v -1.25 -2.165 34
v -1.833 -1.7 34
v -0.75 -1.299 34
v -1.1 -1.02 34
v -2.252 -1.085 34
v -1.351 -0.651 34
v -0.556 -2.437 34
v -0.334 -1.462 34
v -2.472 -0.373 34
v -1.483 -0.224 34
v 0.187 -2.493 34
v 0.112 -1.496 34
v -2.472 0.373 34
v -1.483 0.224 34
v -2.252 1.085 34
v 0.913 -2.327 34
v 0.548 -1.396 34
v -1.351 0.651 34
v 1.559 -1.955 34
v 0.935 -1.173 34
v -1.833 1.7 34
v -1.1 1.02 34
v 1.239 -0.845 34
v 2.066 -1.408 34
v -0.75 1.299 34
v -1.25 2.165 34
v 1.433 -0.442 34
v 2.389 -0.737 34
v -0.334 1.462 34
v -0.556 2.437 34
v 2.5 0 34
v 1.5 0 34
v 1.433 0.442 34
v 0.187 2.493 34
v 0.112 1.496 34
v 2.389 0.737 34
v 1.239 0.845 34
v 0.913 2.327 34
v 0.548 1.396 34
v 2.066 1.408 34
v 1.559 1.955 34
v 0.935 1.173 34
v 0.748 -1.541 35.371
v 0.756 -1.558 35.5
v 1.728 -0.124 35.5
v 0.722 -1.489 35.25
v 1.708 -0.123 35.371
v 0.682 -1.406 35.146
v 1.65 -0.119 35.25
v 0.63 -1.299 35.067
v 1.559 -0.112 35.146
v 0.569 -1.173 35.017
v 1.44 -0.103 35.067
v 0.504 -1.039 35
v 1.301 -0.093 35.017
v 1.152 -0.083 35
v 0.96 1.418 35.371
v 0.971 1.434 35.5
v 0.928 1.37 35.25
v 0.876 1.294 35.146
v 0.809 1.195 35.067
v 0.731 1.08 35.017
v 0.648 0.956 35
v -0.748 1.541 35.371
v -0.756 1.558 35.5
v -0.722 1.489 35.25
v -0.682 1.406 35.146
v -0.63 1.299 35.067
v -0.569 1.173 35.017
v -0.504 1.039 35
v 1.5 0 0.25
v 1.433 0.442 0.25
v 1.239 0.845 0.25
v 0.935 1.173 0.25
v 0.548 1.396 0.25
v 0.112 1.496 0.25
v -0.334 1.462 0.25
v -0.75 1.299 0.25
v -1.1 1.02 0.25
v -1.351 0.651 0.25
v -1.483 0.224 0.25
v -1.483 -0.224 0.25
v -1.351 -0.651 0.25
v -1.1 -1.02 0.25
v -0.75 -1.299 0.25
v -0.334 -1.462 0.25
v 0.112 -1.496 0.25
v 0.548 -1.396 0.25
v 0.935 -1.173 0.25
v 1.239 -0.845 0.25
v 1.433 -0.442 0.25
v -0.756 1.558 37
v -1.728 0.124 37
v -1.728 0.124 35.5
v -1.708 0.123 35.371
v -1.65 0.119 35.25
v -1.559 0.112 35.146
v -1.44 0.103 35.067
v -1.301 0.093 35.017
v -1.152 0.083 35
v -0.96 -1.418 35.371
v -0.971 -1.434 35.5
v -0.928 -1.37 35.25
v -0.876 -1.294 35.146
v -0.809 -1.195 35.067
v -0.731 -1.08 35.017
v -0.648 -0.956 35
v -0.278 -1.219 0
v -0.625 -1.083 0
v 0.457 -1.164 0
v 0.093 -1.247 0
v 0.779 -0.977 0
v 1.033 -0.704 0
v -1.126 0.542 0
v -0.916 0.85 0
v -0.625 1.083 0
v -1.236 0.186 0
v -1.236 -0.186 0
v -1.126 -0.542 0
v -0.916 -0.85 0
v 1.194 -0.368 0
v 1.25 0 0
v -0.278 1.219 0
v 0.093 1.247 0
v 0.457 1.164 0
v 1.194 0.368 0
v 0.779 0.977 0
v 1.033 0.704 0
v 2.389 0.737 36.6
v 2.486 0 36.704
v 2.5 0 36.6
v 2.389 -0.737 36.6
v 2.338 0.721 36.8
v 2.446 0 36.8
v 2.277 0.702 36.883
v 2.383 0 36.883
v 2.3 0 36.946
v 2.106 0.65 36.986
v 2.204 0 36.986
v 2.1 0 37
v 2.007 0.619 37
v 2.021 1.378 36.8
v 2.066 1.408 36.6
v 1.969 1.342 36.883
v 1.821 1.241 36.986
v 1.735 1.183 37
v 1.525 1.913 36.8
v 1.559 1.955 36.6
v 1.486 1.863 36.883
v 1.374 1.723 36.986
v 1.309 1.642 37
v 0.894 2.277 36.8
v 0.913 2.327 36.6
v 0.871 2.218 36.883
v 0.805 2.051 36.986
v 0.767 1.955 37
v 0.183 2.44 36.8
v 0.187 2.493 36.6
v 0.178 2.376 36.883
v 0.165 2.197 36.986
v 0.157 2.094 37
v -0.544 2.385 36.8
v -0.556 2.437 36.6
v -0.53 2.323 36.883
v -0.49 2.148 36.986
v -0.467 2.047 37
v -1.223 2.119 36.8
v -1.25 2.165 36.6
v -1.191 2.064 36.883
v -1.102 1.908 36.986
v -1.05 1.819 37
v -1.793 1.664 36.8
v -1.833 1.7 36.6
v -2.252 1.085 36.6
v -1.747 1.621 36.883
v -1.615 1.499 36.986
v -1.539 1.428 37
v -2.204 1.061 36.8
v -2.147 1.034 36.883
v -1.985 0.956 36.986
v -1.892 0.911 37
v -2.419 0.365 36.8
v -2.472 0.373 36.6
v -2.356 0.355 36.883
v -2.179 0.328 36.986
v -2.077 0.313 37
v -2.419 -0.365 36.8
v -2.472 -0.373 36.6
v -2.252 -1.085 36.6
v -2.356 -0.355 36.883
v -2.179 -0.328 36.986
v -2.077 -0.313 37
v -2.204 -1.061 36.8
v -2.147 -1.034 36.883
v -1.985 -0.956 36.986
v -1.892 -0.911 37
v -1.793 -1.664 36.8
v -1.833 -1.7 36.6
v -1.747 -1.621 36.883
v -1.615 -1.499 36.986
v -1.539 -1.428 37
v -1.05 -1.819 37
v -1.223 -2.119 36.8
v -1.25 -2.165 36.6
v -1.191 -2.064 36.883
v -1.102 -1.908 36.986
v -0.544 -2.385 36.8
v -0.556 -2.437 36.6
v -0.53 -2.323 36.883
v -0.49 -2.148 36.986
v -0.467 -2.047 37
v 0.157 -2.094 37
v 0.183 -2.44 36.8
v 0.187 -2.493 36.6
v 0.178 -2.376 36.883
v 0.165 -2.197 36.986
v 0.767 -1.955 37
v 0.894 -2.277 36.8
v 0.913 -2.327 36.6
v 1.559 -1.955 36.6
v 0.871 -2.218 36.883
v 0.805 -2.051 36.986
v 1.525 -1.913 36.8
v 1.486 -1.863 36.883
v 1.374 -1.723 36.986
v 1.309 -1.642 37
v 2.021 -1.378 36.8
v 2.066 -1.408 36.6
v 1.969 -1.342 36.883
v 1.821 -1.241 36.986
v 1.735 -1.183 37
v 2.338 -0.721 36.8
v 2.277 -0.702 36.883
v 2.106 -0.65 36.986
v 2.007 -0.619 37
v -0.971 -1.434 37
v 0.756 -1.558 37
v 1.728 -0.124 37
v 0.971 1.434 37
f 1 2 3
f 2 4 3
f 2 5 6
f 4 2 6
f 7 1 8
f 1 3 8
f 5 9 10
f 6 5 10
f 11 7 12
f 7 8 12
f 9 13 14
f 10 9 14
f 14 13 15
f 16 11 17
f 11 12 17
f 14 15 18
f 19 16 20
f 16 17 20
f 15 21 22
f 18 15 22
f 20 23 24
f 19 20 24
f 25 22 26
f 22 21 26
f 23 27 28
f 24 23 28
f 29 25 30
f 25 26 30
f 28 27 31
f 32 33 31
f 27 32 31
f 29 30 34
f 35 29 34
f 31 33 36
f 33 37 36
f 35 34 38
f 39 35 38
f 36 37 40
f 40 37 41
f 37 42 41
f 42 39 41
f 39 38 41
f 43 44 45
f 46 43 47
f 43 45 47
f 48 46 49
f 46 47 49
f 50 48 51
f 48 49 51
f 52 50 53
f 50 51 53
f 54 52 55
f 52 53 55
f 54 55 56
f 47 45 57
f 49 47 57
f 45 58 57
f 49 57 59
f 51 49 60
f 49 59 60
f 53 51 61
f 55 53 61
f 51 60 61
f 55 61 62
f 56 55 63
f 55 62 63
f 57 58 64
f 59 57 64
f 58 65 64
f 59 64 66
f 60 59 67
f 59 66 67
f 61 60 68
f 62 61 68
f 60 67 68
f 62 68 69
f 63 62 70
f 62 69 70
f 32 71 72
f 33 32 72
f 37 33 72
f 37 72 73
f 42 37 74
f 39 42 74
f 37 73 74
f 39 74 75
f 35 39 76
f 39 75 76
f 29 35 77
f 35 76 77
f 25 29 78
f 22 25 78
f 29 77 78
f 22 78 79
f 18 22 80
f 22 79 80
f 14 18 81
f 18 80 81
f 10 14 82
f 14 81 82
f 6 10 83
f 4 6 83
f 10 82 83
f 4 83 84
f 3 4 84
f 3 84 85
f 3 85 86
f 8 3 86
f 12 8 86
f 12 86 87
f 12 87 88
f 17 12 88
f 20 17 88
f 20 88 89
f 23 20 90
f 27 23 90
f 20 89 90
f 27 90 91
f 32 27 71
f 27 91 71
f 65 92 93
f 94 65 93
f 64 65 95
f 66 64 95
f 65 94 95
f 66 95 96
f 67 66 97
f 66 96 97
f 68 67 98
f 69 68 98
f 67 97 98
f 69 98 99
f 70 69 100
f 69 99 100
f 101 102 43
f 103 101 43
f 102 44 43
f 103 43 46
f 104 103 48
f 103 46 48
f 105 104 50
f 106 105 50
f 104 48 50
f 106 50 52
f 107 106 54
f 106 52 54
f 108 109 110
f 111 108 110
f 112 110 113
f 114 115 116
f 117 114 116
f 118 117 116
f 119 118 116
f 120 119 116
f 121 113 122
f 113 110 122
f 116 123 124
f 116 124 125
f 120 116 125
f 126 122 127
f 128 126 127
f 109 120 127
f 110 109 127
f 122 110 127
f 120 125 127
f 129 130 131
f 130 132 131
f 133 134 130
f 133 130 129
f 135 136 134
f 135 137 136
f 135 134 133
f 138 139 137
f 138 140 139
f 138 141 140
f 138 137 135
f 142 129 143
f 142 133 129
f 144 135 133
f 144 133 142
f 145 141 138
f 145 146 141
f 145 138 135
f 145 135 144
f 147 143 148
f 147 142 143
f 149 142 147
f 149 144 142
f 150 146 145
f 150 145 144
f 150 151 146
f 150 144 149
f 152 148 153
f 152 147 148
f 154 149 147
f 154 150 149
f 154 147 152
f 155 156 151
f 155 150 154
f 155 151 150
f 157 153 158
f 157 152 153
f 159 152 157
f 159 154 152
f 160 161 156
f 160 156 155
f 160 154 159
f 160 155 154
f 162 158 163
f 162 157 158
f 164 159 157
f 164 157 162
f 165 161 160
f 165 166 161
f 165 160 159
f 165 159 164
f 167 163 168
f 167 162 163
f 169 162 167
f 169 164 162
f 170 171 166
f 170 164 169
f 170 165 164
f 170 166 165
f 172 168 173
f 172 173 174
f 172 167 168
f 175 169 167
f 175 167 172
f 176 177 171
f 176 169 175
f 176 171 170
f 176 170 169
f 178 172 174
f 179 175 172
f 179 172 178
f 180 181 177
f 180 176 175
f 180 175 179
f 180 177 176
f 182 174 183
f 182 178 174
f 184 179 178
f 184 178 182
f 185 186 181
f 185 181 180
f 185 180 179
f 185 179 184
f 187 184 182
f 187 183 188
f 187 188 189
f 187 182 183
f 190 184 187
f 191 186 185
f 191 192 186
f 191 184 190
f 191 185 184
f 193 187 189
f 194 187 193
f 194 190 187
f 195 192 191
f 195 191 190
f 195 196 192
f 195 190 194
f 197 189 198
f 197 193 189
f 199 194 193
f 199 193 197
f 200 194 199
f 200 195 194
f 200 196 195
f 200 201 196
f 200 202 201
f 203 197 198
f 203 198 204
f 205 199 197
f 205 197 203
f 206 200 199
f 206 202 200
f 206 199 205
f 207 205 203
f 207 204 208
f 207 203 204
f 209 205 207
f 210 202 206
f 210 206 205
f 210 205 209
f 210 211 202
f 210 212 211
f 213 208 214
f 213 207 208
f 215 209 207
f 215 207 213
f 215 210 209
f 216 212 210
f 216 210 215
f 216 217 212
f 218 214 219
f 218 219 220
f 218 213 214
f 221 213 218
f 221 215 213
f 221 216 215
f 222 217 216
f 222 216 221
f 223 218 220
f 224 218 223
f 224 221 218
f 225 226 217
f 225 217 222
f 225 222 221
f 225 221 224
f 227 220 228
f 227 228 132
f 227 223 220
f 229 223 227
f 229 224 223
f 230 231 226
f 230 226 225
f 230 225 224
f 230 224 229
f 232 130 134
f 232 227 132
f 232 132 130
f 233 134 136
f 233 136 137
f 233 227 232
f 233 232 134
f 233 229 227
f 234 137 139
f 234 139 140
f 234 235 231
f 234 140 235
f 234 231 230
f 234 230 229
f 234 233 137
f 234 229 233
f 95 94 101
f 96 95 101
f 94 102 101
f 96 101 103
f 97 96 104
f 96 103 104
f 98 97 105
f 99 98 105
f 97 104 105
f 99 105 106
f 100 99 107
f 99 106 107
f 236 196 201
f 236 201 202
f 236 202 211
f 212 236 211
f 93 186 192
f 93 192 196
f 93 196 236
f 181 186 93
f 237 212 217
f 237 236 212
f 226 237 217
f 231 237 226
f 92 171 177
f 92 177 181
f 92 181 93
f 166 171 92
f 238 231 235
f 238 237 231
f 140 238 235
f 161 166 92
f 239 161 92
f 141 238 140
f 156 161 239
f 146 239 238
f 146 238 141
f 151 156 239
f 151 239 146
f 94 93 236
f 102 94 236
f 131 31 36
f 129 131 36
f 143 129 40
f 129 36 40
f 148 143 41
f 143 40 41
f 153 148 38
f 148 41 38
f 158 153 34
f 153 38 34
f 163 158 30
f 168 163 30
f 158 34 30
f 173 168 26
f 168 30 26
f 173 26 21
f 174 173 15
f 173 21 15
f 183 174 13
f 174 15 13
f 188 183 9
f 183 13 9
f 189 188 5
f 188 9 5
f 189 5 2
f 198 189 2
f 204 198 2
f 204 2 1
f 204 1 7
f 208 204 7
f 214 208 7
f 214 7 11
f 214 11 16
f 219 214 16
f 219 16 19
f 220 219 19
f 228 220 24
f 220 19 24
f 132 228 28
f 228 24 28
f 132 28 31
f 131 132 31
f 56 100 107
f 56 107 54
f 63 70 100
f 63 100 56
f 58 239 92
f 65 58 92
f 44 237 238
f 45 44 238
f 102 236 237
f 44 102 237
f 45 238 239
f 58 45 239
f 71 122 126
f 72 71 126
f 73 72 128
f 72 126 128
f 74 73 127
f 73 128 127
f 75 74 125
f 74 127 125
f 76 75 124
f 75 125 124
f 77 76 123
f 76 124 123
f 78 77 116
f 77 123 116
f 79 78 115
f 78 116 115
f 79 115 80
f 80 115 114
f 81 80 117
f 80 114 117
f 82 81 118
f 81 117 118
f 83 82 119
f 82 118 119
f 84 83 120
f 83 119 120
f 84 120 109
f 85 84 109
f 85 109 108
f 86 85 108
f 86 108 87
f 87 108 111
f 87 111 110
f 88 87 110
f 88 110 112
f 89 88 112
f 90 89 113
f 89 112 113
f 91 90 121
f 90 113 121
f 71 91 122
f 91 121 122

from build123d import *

# Parameters (mm, degrees)
SKETCH1_R           = 1.5
BOSS_EXTRUDE1_DEPTH = 34
SKETCH2_R           = 2.5
BOSS_EXTRUDE2_DEPTH = 3
CUT_EXTRUDE1_DEPTH  = 2
FILLET1_R           = 0.4
CHAMFER1_SIZE       = 0.25
FILLET2_R           = 0.5


with BuildPart() as part:
    # Sketch1 → Boss-Extrude1 (new body)
    with BuildSketch(Plane.XY):
        Circle(SKETCH1_R)
    extrude(amount=BOSS_EXTRUDE1_DEPTH)

    # Sketch2 → Boss-Extrude2 (add)
    with BuildSketch(Plane.XY.offset(34)):
        Circle(SKETCH2_R)
    extrude(amount=BOSS_EXTRUDE2_DEPTH)

    # Sketch3 → Cut-Extrude1 (cut)
    with BuildSketch(Plane.XY.offset(37)):
        Polygon((1.72759491, -0.124160484), (0.971323588, 1.434060838), (-0.756271322, 1.558221322), (-1.72759491, 0.124160484), (-0.971323588, -1.434060838), (0.756271322, -1.558221322), align=None)
    extrude(amount=-CUT_EXTRUDE1_DEPTH, mode=Mode.SUBTRACT)

    # Fillet1
    fillet1_edges = [part.edges().sort_by_distance(p)[0] for p in [
        (-2.5, 0, 37),
    ]]
    fillet(fillet1_edges, radius=FILLET1_R)

    # Chamfer1
    chamfer1_edges = [part.edges().sort_by_distance(p)[0] for p in [
        (-1.5, 0, 0),
    ]]
    chamfer(chamfer1_edges, length=CHAMFER1_SIZE)

    # Fillet2
    fillet2_edges = [part.edges().sort_by_distance(p)[0] for p in [
        (1.241933116, -0.841190903, 35),
        (-0.107526133, -1.49614108, 35),
        (-1.349459249, -0.654950177, 35),
        (-1.241933116, 0.841190903, 35),
        (0.107526133, 1.49614108, 35),
        (1.349459249, 0.654950177, 35),
    ]]
    fillet(fillet2_edges, radius=FILLET2_R)


solid = part.part
